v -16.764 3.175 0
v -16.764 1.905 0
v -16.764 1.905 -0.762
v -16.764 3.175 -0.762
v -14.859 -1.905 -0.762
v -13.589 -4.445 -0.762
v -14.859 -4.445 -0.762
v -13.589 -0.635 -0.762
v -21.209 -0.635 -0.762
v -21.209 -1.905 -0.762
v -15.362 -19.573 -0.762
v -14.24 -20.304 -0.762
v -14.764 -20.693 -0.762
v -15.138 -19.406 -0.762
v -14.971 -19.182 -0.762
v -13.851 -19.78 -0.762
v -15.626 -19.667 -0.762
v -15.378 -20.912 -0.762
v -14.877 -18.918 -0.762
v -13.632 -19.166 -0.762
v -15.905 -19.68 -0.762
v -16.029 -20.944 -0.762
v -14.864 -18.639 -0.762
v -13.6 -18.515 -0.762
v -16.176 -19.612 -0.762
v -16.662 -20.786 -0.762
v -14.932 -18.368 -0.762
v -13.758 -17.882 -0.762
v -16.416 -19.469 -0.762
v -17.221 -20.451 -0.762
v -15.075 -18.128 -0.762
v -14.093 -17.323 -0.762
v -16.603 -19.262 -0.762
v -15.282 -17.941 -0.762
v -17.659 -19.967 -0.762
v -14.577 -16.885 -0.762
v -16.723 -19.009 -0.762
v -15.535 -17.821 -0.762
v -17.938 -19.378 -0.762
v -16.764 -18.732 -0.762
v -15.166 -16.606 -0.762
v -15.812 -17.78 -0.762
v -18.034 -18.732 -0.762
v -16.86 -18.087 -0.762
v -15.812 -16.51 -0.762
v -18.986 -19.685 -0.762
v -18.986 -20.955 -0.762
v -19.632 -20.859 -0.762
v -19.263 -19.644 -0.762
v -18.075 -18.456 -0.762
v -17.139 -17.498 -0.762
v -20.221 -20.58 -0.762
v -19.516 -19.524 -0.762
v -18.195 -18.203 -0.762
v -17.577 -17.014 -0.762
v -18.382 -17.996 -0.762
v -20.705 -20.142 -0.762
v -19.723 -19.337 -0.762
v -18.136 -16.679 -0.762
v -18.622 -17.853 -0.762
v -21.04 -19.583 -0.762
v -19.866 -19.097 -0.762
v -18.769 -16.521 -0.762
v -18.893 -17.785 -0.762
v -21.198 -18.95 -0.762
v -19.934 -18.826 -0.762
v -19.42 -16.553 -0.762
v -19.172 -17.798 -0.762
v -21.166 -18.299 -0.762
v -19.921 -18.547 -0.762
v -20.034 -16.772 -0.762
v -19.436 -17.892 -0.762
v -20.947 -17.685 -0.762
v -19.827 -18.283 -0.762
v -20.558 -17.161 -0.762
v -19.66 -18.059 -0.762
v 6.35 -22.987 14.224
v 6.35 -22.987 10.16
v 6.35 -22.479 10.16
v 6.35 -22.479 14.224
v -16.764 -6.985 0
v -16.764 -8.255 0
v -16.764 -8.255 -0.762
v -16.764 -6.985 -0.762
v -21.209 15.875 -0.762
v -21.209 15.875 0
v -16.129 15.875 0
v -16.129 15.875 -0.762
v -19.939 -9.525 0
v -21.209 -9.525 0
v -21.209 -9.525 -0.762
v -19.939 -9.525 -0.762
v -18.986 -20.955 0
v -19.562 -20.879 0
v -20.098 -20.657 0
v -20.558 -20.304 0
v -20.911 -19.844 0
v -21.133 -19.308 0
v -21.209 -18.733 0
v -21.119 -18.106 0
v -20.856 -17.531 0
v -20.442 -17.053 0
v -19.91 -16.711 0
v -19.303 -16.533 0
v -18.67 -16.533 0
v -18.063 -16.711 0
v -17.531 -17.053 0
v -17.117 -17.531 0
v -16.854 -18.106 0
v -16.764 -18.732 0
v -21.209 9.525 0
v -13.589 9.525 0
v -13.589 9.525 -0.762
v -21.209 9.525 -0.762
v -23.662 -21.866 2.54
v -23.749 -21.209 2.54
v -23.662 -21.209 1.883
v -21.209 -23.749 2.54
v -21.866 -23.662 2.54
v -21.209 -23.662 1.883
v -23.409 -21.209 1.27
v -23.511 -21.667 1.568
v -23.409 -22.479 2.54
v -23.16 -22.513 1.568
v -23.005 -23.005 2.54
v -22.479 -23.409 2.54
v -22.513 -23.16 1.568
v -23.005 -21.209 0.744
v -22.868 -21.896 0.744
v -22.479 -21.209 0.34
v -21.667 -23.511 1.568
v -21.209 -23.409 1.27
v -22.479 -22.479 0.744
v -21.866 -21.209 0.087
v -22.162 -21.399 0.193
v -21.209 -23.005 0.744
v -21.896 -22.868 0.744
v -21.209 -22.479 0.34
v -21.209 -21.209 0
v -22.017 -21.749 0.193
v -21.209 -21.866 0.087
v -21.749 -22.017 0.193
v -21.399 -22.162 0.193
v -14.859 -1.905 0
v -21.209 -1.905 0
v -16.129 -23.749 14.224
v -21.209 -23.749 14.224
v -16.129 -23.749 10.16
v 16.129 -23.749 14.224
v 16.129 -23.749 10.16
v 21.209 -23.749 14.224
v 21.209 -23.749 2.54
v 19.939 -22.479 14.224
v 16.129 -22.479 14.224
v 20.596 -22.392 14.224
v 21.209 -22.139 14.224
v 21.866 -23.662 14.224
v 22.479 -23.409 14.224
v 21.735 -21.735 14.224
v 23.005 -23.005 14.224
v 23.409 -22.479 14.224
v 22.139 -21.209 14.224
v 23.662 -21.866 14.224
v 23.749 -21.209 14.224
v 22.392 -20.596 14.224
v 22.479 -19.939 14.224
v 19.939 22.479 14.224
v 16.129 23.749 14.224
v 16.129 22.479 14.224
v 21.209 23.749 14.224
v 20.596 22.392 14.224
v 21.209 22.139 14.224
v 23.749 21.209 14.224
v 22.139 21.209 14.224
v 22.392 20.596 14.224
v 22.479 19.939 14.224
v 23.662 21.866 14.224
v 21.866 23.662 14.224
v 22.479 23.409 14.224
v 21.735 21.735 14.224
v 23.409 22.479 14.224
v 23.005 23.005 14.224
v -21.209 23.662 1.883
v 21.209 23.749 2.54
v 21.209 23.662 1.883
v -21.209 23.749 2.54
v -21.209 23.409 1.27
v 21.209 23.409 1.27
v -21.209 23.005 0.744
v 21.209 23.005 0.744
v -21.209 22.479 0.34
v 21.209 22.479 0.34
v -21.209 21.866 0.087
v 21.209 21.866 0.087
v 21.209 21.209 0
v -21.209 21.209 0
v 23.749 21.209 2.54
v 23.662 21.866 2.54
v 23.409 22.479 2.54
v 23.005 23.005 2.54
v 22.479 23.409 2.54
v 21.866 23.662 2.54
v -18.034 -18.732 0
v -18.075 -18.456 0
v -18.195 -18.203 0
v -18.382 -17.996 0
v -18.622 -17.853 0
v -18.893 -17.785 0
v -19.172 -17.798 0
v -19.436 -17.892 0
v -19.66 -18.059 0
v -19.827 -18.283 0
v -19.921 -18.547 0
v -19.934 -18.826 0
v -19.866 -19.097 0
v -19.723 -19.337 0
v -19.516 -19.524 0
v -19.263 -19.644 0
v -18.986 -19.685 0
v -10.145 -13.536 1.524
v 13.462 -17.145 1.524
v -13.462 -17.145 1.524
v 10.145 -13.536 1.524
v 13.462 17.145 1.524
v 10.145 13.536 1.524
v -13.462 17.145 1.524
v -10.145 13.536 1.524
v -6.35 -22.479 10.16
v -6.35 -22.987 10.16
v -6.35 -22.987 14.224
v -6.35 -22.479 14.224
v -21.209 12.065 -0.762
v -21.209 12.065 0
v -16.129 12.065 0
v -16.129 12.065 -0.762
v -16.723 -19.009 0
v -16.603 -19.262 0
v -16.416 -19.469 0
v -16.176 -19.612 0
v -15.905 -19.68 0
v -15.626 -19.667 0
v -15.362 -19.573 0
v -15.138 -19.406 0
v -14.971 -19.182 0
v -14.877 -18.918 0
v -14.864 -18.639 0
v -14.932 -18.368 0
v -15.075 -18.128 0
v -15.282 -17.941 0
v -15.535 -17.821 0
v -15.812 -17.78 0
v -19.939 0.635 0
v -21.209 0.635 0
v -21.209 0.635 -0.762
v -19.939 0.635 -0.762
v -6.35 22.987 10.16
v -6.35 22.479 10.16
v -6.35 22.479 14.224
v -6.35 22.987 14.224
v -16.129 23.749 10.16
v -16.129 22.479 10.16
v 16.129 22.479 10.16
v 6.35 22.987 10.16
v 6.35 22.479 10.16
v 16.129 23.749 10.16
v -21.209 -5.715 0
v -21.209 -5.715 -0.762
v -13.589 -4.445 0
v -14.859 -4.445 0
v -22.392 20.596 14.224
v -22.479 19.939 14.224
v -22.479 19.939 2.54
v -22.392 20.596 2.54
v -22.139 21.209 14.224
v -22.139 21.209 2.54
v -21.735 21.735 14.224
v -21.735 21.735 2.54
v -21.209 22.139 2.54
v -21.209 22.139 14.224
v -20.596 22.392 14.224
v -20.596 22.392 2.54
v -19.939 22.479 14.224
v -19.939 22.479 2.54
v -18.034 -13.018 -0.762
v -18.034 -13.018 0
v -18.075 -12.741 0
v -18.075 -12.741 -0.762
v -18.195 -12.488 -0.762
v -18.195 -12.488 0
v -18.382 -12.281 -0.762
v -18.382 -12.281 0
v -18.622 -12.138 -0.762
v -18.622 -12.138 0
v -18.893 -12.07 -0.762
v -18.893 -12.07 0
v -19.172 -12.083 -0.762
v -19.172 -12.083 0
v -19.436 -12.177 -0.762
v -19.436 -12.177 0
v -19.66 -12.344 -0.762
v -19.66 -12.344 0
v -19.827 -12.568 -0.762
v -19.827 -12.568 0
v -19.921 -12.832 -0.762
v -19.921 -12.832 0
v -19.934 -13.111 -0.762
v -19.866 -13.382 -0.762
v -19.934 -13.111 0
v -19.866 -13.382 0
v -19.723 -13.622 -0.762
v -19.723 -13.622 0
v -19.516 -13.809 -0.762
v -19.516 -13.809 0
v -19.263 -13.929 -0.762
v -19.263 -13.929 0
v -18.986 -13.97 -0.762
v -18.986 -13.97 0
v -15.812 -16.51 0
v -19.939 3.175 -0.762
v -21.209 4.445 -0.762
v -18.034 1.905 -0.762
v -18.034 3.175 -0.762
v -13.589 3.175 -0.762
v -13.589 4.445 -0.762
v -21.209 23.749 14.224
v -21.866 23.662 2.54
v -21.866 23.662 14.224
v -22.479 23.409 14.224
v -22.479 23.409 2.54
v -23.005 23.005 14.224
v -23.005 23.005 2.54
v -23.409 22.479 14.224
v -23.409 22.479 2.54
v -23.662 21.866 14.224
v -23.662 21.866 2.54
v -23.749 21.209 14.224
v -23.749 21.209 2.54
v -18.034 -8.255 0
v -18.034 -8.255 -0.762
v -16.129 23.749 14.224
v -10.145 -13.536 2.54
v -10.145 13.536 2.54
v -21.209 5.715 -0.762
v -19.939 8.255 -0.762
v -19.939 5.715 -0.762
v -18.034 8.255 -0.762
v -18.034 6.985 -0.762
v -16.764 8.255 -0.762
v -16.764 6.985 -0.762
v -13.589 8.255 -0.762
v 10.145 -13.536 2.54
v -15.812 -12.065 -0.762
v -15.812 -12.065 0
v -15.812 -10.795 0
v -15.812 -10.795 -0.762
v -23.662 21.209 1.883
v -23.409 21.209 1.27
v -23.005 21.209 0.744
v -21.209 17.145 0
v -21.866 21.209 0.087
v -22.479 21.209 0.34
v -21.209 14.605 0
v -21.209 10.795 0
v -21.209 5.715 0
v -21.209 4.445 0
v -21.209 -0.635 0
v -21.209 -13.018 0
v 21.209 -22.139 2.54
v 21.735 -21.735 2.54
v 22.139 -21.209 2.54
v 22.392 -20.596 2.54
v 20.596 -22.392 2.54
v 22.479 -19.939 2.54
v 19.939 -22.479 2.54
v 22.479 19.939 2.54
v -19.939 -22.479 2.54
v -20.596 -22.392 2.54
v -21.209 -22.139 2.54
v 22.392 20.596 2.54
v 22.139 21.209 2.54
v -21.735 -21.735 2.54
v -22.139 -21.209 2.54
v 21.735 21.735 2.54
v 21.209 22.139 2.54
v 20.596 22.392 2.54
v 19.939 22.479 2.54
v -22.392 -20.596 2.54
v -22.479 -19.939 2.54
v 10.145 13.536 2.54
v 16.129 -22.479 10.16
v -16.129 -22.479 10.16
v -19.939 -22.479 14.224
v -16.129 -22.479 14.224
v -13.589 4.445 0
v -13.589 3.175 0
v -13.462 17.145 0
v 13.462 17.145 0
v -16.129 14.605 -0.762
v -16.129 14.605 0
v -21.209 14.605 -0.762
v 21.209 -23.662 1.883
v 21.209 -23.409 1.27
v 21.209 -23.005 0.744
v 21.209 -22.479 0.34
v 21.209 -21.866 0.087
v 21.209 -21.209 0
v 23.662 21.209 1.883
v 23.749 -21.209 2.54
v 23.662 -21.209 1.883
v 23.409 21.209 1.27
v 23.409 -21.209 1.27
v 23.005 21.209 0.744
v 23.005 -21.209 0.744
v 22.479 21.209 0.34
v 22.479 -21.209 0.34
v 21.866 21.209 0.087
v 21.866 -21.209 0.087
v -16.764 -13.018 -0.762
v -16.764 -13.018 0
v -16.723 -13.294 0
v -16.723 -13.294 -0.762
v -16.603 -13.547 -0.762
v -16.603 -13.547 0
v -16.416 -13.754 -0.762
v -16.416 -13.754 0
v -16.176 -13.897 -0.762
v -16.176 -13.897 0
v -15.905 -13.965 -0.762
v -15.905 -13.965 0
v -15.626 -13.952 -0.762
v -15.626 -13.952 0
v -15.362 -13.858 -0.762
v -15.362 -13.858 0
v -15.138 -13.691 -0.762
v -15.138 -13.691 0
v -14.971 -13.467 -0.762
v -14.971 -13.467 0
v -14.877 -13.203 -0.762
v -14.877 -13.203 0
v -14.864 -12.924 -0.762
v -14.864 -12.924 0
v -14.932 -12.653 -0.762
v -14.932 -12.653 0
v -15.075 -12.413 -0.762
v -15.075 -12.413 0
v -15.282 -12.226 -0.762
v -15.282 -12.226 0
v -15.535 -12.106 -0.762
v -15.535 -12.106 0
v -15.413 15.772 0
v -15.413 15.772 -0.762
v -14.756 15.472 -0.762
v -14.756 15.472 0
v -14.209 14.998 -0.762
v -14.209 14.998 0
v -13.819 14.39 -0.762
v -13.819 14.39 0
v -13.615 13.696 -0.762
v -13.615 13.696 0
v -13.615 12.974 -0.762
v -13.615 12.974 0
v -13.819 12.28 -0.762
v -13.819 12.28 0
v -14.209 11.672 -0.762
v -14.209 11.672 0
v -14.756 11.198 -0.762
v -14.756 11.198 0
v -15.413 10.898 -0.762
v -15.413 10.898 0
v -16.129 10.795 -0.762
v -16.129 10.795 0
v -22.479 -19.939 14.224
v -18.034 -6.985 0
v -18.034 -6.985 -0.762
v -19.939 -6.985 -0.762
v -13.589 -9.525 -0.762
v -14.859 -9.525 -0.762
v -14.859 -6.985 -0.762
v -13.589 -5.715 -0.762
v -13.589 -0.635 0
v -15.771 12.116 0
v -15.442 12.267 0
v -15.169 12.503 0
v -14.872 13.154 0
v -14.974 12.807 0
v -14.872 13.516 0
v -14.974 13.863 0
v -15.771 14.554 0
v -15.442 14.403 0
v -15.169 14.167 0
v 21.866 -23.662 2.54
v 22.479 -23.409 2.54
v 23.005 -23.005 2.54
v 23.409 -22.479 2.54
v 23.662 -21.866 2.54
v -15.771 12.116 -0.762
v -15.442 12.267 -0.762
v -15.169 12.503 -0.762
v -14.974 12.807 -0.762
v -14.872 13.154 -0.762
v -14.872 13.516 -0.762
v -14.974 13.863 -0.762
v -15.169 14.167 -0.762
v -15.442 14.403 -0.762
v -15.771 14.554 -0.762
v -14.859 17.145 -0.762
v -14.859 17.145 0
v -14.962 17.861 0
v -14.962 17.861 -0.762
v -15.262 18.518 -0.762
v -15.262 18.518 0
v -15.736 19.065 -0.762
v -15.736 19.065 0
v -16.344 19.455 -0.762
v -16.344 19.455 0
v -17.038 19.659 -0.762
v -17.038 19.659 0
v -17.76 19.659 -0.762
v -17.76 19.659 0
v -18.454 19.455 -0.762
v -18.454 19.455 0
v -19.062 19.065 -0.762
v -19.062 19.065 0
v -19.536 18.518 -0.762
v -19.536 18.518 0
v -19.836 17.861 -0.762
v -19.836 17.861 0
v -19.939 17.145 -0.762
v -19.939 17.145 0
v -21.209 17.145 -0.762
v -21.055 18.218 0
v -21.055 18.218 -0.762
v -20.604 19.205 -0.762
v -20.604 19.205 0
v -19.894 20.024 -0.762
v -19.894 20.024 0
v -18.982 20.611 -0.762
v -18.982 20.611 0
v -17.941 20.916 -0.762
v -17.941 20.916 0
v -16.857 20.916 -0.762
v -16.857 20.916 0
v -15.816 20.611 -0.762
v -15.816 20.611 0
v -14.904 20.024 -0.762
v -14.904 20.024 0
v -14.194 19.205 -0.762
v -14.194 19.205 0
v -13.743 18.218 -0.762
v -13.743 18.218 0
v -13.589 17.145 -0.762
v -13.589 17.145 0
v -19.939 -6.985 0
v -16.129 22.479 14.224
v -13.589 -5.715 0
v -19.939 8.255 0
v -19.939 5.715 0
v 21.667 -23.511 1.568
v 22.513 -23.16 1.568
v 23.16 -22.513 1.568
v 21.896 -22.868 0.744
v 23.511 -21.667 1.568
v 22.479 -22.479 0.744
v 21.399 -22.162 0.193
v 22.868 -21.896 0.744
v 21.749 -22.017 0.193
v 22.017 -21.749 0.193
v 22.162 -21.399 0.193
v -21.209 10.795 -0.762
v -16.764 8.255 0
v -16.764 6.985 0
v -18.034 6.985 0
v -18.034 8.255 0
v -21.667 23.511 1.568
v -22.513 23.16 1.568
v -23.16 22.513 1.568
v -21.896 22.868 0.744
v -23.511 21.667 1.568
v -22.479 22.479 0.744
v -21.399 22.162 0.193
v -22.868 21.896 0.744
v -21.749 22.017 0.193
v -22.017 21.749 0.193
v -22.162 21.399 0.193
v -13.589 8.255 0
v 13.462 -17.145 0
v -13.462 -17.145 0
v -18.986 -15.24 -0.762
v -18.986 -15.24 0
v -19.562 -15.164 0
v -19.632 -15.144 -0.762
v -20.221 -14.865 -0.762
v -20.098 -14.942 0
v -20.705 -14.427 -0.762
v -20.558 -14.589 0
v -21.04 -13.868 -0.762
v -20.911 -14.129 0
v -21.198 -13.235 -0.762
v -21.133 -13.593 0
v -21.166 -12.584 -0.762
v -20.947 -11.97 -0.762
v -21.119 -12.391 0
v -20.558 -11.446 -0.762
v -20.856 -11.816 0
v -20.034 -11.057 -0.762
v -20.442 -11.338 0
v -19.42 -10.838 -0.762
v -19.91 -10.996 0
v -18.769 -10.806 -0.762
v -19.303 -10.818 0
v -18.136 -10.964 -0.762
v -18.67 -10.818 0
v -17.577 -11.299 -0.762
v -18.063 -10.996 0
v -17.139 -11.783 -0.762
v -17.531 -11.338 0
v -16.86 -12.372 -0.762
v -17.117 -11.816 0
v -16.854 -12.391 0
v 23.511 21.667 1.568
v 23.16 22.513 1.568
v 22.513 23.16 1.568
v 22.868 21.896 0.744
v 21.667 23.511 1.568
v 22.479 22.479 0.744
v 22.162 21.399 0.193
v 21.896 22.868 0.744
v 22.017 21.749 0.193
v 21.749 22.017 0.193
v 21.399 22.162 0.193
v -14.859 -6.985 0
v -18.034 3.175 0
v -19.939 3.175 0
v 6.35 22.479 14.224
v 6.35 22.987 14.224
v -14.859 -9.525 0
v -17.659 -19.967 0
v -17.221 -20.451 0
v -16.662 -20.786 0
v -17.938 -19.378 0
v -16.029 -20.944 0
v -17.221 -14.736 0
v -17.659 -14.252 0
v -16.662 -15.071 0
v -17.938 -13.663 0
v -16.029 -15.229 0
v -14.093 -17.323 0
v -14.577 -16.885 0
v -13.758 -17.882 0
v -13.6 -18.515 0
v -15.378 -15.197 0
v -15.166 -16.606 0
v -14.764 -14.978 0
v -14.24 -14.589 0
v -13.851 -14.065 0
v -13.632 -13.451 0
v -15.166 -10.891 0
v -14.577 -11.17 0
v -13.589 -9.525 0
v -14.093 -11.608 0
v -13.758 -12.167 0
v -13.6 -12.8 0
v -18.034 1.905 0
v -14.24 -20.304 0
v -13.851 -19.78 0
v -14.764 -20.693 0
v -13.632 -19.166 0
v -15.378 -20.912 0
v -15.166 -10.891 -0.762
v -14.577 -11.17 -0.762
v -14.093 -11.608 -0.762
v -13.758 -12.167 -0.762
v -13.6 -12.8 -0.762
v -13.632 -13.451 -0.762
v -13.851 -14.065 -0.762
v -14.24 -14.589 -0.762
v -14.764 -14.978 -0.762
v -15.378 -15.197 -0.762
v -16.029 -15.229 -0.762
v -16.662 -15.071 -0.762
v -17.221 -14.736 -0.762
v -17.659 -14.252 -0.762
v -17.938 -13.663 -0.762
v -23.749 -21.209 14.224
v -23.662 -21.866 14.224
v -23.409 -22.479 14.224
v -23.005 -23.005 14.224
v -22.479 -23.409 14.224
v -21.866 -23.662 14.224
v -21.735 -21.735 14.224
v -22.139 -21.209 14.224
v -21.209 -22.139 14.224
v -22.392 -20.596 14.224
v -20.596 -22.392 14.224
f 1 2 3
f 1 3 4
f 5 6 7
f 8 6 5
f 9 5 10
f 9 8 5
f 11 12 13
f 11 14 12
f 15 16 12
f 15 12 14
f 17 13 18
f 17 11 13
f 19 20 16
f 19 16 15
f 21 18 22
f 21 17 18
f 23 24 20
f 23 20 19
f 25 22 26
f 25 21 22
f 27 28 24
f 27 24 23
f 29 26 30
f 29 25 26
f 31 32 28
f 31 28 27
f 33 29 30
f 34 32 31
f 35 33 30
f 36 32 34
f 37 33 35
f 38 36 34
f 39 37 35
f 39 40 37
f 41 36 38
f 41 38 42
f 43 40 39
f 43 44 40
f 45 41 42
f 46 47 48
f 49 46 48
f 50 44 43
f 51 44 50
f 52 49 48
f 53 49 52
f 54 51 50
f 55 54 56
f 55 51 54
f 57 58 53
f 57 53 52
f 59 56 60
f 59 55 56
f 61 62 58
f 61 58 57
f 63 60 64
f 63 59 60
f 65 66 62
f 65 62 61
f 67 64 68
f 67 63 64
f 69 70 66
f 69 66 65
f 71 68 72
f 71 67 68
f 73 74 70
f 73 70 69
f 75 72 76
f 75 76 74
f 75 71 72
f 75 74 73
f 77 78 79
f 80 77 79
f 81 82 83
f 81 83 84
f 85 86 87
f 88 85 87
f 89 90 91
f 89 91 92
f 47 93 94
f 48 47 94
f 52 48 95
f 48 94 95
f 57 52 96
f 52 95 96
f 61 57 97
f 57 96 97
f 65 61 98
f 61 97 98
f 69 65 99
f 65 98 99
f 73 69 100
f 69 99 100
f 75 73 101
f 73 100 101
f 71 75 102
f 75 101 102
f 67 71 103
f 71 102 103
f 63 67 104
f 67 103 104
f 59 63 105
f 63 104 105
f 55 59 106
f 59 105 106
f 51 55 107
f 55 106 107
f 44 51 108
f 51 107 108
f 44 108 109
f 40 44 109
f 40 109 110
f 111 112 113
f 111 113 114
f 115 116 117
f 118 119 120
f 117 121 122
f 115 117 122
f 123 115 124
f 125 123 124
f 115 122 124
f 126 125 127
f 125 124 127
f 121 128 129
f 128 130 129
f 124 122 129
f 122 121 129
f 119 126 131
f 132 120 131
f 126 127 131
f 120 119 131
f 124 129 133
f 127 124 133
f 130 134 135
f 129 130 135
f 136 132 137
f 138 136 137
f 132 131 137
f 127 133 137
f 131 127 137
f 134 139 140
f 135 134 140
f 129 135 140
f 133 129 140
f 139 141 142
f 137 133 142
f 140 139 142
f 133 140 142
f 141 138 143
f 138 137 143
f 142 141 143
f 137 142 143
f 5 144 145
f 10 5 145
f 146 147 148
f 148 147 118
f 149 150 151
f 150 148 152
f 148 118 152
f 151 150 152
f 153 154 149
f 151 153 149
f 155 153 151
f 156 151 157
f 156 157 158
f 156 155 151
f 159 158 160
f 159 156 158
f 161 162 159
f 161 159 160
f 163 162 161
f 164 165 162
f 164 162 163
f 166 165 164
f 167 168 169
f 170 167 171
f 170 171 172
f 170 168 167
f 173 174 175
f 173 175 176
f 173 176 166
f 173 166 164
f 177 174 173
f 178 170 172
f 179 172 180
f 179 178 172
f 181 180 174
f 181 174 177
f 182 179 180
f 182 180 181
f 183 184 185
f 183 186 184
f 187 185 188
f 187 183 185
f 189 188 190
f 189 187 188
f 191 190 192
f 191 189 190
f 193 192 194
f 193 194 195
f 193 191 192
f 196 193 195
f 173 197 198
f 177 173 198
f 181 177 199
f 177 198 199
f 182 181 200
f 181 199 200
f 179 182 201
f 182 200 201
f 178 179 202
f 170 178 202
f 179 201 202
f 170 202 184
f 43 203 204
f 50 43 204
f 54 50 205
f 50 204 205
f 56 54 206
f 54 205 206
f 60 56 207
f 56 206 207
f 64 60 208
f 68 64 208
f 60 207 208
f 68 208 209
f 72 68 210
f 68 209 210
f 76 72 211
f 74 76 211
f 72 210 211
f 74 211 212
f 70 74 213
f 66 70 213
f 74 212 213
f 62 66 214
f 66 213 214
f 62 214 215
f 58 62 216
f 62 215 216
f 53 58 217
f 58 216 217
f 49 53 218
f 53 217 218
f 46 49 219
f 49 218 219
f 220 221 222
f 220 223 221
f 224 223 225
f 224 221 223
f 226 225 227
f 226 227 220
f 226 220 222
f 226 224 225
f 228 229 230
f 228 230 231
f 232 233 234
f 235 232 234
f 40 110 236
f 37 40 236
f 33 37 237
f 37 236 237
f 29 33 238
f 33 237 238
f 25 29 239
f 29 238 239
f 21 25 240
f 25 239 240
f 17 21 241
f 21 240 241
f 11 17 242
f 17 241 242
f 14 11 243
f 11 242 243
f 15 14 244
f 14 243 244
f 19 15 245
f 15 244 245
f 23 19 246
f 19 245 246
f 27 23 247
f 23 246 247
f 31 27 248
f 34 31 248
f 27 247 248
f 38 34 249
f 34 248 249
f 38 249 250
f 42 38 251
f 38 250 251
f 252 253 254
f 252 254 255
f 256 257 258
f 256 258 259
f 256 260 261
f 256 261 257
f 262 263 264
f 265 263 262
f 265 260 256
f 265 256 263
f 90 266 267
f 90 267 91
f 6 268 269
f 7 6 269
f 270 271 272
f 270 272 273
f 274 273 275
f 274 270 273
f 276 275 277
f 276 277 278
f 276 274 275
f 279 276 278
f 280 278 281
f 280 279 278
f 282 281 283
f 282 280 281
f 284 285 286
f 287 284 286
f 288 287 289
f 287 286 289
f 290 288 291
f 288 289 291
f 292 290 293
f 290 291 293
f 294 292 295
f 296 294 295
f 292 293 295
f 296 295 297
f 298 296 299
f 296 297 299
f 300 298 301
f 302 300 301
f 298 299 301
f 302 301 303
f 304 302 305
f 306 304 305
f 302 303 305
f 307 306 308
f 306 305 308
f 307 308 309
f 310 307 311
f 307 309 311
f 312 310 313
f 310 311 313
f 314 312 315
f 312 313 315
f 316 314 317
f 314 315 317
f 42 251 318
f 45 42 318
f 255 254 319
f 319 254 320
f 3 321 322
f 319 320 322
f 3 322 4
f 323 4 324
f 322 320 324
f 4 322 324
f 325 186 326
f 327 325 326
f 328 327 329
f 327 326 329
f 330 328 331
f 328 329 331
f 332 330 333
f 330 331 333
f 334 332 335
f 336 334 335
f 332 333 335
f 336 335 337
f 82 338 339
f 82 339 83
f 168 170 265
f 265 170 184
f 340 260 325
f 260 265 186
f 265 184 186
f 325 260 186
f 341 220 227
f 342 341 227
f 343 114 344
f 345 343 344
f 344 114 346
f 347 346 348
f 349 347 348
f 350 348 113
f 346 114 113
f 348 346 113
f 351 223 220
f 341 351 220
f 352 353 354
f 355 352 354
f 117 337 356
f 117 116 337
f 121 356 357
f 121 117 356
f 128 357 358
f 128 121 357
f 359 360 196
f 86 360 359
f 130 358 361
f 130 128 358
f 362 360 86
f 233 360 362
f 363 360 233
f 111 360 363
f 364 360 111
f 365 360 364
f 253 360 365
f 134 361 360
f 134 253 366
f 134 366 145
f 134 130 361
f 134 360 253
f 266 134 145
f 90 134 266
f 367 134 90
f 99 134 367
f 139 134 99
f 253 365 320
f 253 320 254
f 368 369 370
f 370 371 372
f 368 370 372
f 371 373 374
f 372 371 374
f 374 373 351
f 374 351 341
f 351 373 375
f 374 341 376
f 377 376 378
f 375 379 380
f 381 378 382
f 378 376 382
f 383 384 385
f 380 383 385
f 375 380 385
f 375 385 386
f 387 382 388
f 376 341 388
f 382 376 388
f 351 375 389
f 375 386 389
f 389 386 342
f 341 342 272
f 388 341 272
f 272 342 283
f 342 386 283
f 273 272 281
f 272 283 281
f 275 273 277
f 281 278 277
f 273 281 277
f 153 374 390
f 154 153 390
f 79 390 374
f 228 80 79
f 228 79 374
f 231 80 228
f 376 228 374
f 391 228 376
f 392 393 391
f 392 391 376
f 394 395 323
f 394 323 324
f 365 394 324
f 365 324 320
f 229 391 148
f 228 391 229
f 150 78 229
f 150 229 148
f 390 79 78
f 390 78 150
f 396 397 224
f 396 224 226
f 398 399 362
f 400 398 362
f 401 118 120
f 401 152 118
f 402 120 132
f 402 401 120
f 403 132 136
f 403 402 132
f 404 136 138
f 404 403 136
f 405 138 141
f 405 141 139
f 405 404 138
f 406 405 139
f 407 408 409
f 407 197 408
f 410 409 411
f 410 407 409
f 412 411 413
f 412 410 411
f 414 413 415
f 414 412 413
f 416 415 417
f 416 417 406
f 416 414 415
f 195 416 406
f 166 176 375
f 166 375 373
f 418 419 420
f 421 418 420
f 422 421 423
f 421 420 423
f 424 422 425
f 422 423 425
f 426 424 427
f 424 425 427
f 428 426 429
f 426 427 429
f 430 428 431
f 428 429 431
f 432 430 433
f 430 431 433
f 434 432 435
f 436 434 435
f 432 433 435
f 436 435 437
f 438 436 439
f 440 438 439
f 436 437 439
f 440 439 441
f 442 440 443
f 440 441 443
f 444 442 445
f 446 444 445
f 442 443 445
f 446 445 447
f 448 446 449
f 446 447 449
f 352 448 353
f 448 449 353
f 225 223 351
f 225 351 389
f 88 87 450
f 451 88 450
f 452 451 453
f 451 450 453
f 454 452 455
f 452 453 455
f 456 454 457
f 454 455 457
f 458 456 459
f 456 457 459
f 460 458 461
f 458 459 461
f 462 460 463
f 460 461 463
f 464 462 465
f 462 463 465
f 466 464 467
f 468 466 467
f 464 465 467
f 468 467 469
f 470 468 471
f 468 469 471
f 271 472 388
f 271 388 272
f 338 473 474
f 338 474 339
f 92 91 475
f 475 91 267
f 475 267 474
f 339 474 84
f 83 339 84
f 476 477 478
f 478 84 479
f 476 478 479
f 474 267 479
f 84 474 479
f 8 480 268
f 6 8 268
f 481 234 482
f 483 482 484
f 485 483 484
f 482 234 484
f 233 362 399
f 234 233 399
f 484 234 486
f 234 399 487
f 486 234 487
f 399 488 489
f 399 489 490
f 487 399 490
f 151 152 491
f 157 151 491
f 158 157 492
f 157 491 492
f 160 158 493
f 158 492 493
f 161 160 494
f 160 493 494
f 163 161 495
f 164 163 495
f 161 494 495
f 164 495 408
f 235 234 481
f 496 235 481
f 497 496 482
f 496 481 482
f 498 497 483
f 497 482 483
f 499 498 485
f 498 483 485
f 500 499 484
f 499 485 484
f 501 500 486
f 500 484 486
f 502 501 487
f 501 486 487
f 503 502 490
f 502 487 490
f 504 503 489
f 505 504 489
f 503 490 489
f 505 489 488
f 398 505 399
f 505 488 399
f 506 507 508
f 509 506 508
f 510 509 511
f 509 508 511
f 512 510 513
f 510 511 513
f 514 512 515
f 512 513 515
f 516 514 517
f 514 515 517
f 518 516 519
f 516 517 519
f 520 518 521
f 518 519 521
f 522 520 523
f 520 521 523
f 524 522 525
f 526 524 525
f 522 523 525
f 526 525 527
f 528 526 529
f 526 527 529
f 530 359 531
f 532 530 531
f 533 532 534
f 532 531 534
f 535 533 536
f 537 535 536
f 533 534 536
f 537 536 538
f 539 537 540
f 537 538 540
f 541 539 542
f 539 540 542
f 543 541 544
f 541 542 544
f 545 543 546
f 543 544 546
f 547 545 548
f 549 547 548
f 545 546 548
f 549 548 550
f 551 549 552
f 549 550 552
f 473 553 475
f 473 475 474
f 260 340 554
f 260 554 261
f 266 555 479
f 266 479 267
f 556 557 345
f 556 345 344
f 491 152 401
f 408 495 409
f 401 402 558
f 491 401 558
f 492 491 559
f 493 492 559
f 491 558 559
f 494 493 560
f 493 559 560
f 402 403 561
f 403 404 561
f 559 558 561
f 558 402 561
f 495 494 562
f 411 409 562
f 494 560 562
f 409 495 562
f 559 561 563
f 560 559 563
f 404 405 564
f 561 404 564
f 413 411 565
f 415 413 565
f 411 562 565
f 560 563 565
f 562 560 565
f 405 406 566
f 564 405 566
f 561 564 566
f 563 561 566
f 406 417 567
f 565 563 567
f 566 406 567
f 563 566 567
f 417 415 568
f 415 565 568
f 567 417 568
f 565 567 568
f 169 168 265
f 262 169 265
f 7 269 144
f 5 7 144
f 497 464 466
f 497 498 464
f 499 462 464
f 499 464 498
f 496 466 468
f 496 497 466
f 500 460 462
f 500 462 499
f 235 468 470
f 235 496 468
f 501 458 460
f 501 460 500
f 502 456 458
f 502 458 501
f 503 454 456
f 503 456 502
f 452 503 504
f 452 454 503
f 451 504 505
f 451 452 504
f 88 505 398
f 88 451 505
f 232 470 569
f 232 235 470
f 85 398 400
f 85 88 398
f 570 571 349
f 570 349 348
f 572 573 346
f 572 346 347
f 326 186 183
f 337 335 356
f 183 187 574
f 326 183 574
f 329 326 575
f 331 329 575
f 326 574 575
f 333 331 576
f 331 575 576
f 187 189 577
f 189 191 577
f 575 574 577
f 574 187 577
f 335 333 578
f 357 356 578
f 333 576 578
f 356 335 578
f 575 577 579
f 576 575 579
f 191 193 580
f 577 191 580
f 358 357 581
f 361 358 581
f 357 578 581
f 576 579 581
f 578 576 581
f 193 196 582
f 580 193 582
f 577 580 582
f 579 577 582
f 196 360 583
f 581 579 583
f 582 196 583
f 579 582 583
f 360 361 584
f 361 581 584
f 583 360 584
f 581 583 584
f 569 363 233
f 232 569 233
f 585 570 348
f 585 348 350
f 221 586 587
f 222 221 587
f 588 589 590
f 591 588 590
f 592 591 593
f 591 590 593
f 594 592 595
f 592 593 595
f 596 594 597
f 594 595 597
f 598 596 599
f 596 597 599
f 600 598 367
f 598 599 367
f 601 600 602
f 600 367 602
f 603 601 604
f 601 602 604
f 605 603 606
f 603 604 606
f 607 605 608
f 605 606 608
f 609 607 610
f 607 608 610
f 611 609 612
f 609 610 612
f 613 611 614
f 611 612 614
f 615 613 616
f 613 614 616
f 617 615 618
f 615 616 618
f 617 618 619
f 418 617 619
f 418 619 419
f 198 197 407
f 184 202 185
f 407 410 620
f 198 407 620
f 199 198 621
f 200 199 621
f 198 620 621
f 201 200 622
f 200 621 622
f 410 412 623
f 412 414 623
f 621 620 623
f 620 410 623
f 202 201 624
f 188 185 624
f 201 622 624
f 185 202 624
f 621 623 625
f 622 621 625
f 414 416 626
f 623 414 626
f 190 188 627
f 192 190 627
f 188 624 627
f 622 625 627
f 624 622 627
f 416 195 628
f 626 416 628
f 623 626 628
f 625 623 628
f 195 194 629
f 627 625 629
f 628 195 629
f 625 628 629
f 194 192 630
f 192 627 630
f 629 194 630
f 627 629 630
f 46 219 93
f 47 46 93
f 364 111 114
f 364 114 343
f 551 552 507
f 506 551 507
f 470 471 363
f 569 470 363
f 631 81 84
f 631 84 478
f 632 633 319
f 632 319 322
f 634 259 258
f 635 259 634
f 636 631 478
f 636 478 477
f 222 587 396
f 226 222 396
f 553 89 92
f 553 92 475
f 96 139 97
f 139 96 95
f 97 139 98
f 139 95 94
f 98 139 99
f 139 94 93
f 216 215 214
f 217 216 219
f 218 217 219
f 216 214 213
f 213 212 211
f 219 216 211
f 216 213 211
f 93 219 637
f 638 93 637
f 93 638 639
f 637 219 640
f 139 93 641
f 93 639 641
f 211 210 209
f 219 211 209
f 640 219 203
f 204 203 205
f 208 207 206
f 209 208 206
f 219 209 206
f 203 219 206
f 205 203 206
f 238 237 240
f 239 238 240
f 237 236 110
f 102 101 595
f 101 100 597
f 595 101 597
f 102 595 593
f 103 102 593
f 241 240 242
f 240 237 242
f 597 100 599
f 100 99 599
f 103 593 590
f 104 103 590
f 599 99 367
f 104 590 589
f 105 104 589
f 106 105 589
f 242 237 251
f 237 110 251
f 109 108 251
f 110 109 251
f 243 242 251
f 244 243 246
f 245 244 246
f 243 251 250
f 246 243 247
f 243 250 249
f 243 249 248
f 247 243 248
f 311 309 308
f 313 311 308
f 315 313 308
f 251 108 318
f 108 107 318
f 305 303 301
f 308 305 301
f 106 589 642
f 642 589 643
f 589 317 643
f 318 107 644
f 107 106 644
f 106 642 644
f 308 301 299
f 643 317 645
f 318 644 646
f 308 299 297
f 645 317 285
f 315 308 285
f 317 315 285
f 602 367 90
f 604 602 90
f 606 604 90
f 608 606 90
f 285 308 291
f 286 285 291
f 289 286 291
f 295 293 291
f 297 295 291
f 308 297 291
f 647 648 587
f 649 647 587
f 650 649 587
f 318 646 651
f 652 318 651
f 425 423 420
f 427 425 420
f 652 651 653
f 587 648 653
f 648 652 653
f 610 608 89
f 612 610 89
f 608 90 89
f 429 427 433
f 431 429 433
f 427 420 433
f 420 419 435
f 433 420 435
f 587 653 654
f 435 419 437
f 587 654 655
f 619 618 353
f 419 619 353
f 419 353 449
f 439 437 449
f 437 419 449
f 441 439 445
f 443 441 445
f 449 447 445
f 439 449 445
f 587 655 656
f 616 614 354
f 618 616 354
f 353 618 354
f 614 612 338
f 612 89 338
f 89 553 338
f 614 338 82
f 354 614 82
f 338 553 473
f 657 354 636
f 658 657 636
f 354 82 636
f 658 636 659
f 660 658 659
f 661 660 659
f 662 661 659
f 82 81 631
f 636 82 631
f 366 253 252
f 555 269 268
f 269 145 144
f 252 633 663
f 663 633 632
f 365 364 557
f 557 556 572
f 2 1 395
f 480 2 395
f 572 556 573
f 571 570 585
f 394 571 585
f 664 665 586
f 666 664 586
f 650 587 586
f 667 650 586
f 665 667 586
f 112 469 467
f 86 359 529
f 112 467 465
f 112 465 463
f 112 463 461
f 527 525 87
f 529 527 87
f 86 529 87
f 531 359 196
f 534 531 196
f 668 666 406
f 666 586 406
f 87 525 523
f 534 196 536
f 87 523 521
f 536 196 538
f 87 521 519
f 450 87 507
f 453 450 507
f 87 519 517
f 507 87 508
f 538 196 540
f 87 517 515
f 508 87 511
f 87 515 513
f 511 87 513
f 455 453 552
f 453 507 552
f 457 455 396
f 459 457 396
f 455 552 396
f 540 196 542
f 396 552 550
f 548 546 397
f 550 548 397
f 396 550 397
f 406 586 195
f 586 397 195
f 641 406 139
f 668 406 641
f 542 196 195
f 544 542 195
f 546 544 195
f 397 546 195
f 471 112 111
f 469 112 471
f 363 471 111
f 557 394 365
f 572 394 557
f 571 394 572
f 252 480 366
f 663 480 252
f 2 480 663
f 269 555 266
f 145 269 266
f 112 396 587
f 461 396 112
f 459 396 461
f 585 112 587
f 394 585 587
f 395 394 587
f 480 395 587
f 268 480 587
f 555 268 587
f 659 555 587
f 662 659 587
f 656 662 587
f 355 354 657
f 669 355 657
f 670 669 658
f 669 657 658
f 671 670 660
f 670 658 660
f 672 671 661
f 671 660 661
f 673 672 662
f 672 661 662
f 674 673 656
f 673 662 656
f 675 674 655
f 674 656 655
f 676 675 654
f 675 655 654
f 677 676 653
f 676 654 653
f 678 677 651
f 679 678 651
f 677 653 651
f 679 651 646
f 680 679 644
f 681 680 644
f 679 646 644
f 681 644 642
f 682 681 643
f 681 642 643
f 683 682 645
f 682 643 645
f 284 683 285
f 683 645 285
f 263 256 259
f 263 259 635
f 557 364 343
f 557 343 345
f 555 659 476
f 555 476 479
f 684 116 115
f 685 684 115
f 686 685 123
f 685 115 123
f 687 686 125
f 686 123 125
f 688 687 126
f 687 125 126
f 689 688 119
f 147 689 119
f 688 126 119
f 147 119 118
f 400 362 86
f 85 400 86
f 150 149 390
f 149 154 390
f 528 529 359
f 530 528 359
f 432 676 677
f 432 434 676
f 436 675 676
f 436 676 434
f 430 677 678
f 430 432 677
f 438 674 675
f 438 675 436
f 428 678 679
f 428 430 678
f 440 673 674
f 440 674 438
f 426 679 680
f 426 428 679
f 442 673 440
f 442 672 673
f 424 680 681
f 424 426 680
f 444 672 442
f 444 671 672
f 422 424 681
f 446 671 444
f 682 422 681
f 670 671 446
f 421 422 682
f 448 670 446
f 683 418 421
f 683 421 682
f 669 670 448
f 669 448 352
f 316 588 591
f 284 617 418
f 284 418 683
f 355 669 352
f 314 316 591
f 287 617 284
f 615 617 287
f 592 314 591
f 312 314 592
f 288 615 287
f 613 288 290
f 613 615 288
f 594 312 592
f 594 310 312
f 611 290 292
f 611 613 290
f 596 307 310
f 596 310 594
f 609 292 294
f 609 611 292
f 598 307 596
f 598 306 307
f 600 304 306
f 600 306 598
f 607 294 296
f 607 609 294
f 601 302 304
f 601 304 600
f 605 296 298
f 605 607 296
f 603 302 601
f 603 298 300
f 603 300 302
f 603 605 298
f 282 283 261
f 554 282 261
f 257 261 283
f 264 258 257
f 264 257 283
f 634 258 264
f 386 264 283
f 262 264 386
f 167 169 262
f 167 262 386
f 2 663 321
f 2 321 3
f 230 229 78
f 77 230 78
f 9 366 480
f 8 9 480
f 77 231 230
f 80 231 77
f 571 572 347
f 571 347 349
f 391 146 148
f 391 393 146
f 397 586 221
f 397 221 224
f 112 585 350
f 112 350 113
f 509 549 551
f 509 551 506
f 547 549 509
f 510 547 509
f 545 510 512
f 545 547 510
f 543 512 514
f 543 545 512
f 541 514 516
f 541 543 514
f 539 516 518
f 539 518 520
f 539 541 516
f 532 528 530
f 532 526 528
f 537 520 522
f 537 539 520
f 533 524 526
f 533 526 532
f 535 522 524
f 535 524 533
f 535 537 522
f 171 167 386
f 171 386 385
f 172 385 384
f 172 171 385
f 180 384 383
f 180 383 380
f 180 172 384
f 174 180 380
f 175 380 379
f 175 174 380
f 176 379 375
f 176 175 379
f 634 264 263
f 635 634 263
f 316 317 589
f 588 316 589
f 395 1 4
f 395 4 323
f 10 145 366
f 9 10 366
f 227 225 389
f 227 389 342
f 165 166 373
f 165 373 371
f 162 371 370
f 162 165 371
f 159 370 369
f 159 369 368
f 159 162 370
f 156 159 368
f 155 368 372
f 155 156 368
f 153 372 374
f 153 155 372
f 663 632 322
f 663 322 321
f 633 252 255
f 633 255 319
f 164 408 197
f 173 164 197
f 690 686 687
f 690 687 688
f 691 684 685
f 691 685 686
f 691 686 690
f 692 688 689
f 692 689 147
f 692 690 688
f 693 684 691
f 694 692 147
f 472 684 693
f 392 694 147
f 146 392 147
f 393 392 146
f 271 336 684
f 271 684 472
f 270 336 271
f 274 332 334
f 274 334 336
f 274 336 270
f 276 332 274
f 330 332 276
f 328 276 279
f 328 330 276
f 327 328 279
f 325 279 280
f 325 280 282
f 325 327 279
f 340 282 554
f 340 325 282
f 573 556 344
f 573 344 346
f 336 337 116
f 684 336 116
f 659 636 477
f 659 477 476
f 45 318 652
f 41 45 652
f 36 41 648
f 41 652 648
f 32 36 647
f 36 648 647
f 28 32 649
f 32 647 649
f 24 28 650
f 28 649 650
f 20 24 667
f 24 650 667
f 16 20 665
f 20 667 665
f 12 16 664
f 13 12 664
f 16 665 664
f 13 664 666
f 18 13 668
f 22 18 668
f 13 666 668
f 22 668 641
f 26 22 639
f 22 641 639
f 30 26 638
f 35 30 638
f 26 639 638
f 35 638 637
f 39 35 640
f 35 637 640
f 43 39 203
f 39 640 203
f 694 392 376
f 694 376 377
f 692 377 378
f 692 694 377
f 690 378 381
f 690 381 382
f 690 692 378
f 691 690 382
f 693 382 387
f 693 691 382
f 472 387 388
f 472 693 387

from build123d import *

# Parameters (mm, degrees)
BOSS_EXTRUDE1_DEPTH     = 14.224
CUT_EXTRUDE1_DEPTH      = 11.684
FILLET1_R               = 2.54
SKETCH3_W               = 32.258
SKETCH3_H               = 8.128
CUT_EXTRUDE2_DEPTH      = 1
CUT_EXTRUDE2_DEPTH_BACK = 48.498
SKETCH5_W               = 26.924
SKETCH5_H               = 34.29
CUT_EXTRUDE4_DEPTH      = 1.524
SKETCH6_W               = 20.290608306
SKETCH6_H               = 27.072145664
CUT_EXTRUDE5_DEPTH      = 1.524
BOSS_EXTRUDE2_DEPTH     = 0.762
SKETCH8_W               = 12.7
SKETCH8_H               = 0.508
BOSS_EXTRUDE3_DEPTH     = 4.064


with BuildPart() as part:
    # Sketch1 → Boss-Extrude1 (new body)
    with BuildSketch(Plane.XY):
        with BuildLine():
            Line((-21.209, -23.749), (21.209, -23.749))
            ThreePointArc((21.209, -23.749), (23.005051224, -23.005051224), (23.749, -21.209))
            Line((23.749, -21.209), (23.749, 21.209))
            ThreePointArc((23.749, 21.209), (23.005051224, 23.005051224), (21.209, 23.749))
            Line((21.209, 23.749), (-21.209, 23.749))
            ThreePointArc((-21.209, 23.749), (-23.005051224, 23.005051224), (-23.749, 21.209))
            Line((-23.749, 21.209), (-23.749, -21.209))
            ThreePointArc((-23.749, -21.209), (-23.005051224, -23.005051224), (-21.209, -23.749))
        make_face()
    extrude(amount=BOSS_EXTRUDE1_DEPTH)

    # Sketch2 → Cut-Extrude1 (cut)
    with BuildSketch(Plane.XY.offset(14.224)):
        with BuildLine():
            Line((19.939, -22.479), (-19.939, -22.479))
            ThreePointArc((-19.939, -22.479), (-21.735051224, -21.735051224), (-22.479, -19.939))
            Line((-22.479, -19.939), (-22.479, 19.939))
            ThreePointArc((-22.479, 19.939), (-21.735051224, 21.735051224), (-19.939, 22.479))
            Line((-19.939, 22.479), (19.939, 22.479))
            ThreePointArc((19.939, 22.479), (21.735051224, 21.735051224), (22.479, 19.939))
            Line((22.479, 19.939), (22.479, -19.939))
            ThreePointArc((22.479, -19.939), (21.735051224, -21.735051224), (19.939, -22.479))
        make_face()
    extrude(amount=-CUT_EXTRUDE1_DEPTH, mode=Mode.SUBTRACT)

    # Fillet1
    fillet1_edges = [part.edges().sort_by_distance(p)[0] for p in [
        (0, -23.749, 0),
        (-23.005051224, -23.005051224, 0),
        (-23.749, 0, 0),
        (-23.005051224, 23.005051224, 0),
        (0, 23.749, 0),
        (23.005051224, 23.005051224, 0),
        (23.749, 0, 0),
        (23.005051224, -23.005051224, 0),
    ]]
    fillet(fillet1_edges, radius=FILLET1_R)

    # Sketch3 → Cut-Extrude2 (cut, two sides)
    with BuildSketch(Plane(origin=(0, 23.749, 0), x_dir=(1, 0, 0), z_dir=(0, 1, 0))) as cut_extrude2_sk:
        with Locations((0, -14.224)):
            Rectangle(SKETCH3_W, SKETCH3_H)
    extrude(amount=CUT_EXTRUDE2_DEPTH, mode=Mode.SUBTRACT)
    extrude(cut_extrude2_sk.sketch, amount=-CUT_EXTRUDE2_DEPTH_BACK, mode=Mode.SUBTRACT)

    # Sketch5 → Cut-Extrude4 (cut)
    with BuildSketch(Plane(origin=(0, 0, 0), x_dir=(-1, 0, 0), z_dir=(0, 0, -1))):
        Rectangle(SKETCH5_W, SKETCH5_H)
    extrude(amount=-CUT_EXTRUDE4_DEPTH, mode=Mode.SUBTRACT)

    # Sketch6 → Cut-Extrude5 (cut)
    with BuildSketch(Plane(origin=(0, 0, 1.524), x_dir=(-1, 0, 0), z_dir=(0, 0, -1))):
        Rectangle(SKETCH6_W, SKETCH6_H)
    extrude(amount=-CUT_EXTRUDE5_DEPTH, mode=Mode.SUBTRACT)

    # Sketch7 → Boss-Extrude2 (add)
    with BuildSketch(Plane(origin=(0, 0, 0), x_dir=(-1, 0, 0), z_dir=(0, 0, -1))):
        with BuildLine():
            Line((19.939, 17.145), (21.209, 17.145))
            ThreePointArc((21.209, 17.145), (17.399, 20.955), (13.589, 17.145))
            Line((13.589, 17.145), (14.859, 17.145))
            ThreePointArc((14.859, 17.145), (17.399, 19.685), (19.939, 17.145))
        make_face()
        with BuildLine():
            Line((21.209, 15.875), (16.129, 15.875))
            ThreePointArc((16.129, 15.875), (13.589, 13.335), (16.129, 10.795))
            Line((16.129, 10.795), (21.209, 10.795))
            Line((21.209, 10.795), (21.209, 12.065))
            Line((21.209, 12.065), (16.129, 12.065))
            ThreePointArc((16.129, 12.065), (14.859, 13.335), (16.129, 14.605))
            Line((16.129, 14.605), (21.209, 14.605))
            Line((21.209, 14.605), (21.209, 15.875))
        make_face()
        Polygon((13.589, 9.525), (21.209, 9.525), (21.209, 5.715), (19.939, 5.715), (19.939, 8.255), (18.034, 8.255), (18.034, 6.985), (16.764, 6.985), (16.764, 8.255), (13.589, 8.255), align=None)
        Polygon((13.589, 4.445), (21.209, 4.445), (21.209, 0.635), (19.939, 0.635), (19.939, 3.175), (18.034, 3.175), (18.034, 1.905), (16.764, 1.905), (16.764, 3.175), (13.589, 3.175), align=None)
        Polygon((21.209, -0.635), (13.589, -0.635), (13.589, -4.445), (14.859, -4.445), (14.859, -1.905), (21.209, -1.905), align=None)
        Polygon((13.589, -5.715), (21.209, -5.715), (21.209, -9.525), (19.939, -9.525), (19.939, -6.985), (18.034, -6.985), (18.034, -8.255), (16.764, -8.255), (16.764, -6.985), (14.859, -6.985), (14.859, -9.525), (13.589, -9.525), align=None)
        with BuildLine():
            Line((18.9865, -13.97), (18.9865, -15.24))
            ThreePointArc((18.9865, -15.24), (20.558044821, -11.445955179), (16.764, -13.0175))
            ThreePointArc((16.764, -13.0175), (15.137980791, -13.691019209), (15.8115, -12.065))
            Line((15.8115, -12.065), (15.8115, -10.795))
            ThreePointArc((15.8115, -10.795), (14.239955179, -14.589044821), (18.034, -13.0175))
            ThreePointArc((18.034, -13.0175), (19.660019209, -12.343980791), (18.9865, -13.97))
        make_face()
        with BuildLine():
            Line((15.8115, -17.78), (15.8115, -16.51))
            ThreePointArc((15.8115, -16.51), (14.239955179, -20.304044821), (18.034, -18.7325))
            ThreePointArc((18.034, -18.7325), (19.660019209, -18.058980791), (18.9865, -19.685))
            Line((18.9865, -19.685), (18.9865, -20.955))
            ThreePointArc((18.9865, -20.955), (20.558044821, -17.160955179), (16.764, -18.7325))
            ThreePointArc((16.764, -18.7325), (15.137980791, -19.406019209), (15.8115, -17.78))
        make_face()
    extrude(amount=BOSS_EXTRUDE2_DEPTH)

    # Sketch8 → Boss-Extrude3 (add)
    with BuildSketch(Plane.XY.offset(10.16)):
        with Locations((0, 22.733)):
            Rectangle(SKETCH8_W, SKETCH8_H)
        with Locations((0, -22.733)):
            Rectangle(SKETCH8_W, SKETCH8_H)
    extrude(amount=BOSS_EXTRUDE3_DEPTH)


solid = part.part
